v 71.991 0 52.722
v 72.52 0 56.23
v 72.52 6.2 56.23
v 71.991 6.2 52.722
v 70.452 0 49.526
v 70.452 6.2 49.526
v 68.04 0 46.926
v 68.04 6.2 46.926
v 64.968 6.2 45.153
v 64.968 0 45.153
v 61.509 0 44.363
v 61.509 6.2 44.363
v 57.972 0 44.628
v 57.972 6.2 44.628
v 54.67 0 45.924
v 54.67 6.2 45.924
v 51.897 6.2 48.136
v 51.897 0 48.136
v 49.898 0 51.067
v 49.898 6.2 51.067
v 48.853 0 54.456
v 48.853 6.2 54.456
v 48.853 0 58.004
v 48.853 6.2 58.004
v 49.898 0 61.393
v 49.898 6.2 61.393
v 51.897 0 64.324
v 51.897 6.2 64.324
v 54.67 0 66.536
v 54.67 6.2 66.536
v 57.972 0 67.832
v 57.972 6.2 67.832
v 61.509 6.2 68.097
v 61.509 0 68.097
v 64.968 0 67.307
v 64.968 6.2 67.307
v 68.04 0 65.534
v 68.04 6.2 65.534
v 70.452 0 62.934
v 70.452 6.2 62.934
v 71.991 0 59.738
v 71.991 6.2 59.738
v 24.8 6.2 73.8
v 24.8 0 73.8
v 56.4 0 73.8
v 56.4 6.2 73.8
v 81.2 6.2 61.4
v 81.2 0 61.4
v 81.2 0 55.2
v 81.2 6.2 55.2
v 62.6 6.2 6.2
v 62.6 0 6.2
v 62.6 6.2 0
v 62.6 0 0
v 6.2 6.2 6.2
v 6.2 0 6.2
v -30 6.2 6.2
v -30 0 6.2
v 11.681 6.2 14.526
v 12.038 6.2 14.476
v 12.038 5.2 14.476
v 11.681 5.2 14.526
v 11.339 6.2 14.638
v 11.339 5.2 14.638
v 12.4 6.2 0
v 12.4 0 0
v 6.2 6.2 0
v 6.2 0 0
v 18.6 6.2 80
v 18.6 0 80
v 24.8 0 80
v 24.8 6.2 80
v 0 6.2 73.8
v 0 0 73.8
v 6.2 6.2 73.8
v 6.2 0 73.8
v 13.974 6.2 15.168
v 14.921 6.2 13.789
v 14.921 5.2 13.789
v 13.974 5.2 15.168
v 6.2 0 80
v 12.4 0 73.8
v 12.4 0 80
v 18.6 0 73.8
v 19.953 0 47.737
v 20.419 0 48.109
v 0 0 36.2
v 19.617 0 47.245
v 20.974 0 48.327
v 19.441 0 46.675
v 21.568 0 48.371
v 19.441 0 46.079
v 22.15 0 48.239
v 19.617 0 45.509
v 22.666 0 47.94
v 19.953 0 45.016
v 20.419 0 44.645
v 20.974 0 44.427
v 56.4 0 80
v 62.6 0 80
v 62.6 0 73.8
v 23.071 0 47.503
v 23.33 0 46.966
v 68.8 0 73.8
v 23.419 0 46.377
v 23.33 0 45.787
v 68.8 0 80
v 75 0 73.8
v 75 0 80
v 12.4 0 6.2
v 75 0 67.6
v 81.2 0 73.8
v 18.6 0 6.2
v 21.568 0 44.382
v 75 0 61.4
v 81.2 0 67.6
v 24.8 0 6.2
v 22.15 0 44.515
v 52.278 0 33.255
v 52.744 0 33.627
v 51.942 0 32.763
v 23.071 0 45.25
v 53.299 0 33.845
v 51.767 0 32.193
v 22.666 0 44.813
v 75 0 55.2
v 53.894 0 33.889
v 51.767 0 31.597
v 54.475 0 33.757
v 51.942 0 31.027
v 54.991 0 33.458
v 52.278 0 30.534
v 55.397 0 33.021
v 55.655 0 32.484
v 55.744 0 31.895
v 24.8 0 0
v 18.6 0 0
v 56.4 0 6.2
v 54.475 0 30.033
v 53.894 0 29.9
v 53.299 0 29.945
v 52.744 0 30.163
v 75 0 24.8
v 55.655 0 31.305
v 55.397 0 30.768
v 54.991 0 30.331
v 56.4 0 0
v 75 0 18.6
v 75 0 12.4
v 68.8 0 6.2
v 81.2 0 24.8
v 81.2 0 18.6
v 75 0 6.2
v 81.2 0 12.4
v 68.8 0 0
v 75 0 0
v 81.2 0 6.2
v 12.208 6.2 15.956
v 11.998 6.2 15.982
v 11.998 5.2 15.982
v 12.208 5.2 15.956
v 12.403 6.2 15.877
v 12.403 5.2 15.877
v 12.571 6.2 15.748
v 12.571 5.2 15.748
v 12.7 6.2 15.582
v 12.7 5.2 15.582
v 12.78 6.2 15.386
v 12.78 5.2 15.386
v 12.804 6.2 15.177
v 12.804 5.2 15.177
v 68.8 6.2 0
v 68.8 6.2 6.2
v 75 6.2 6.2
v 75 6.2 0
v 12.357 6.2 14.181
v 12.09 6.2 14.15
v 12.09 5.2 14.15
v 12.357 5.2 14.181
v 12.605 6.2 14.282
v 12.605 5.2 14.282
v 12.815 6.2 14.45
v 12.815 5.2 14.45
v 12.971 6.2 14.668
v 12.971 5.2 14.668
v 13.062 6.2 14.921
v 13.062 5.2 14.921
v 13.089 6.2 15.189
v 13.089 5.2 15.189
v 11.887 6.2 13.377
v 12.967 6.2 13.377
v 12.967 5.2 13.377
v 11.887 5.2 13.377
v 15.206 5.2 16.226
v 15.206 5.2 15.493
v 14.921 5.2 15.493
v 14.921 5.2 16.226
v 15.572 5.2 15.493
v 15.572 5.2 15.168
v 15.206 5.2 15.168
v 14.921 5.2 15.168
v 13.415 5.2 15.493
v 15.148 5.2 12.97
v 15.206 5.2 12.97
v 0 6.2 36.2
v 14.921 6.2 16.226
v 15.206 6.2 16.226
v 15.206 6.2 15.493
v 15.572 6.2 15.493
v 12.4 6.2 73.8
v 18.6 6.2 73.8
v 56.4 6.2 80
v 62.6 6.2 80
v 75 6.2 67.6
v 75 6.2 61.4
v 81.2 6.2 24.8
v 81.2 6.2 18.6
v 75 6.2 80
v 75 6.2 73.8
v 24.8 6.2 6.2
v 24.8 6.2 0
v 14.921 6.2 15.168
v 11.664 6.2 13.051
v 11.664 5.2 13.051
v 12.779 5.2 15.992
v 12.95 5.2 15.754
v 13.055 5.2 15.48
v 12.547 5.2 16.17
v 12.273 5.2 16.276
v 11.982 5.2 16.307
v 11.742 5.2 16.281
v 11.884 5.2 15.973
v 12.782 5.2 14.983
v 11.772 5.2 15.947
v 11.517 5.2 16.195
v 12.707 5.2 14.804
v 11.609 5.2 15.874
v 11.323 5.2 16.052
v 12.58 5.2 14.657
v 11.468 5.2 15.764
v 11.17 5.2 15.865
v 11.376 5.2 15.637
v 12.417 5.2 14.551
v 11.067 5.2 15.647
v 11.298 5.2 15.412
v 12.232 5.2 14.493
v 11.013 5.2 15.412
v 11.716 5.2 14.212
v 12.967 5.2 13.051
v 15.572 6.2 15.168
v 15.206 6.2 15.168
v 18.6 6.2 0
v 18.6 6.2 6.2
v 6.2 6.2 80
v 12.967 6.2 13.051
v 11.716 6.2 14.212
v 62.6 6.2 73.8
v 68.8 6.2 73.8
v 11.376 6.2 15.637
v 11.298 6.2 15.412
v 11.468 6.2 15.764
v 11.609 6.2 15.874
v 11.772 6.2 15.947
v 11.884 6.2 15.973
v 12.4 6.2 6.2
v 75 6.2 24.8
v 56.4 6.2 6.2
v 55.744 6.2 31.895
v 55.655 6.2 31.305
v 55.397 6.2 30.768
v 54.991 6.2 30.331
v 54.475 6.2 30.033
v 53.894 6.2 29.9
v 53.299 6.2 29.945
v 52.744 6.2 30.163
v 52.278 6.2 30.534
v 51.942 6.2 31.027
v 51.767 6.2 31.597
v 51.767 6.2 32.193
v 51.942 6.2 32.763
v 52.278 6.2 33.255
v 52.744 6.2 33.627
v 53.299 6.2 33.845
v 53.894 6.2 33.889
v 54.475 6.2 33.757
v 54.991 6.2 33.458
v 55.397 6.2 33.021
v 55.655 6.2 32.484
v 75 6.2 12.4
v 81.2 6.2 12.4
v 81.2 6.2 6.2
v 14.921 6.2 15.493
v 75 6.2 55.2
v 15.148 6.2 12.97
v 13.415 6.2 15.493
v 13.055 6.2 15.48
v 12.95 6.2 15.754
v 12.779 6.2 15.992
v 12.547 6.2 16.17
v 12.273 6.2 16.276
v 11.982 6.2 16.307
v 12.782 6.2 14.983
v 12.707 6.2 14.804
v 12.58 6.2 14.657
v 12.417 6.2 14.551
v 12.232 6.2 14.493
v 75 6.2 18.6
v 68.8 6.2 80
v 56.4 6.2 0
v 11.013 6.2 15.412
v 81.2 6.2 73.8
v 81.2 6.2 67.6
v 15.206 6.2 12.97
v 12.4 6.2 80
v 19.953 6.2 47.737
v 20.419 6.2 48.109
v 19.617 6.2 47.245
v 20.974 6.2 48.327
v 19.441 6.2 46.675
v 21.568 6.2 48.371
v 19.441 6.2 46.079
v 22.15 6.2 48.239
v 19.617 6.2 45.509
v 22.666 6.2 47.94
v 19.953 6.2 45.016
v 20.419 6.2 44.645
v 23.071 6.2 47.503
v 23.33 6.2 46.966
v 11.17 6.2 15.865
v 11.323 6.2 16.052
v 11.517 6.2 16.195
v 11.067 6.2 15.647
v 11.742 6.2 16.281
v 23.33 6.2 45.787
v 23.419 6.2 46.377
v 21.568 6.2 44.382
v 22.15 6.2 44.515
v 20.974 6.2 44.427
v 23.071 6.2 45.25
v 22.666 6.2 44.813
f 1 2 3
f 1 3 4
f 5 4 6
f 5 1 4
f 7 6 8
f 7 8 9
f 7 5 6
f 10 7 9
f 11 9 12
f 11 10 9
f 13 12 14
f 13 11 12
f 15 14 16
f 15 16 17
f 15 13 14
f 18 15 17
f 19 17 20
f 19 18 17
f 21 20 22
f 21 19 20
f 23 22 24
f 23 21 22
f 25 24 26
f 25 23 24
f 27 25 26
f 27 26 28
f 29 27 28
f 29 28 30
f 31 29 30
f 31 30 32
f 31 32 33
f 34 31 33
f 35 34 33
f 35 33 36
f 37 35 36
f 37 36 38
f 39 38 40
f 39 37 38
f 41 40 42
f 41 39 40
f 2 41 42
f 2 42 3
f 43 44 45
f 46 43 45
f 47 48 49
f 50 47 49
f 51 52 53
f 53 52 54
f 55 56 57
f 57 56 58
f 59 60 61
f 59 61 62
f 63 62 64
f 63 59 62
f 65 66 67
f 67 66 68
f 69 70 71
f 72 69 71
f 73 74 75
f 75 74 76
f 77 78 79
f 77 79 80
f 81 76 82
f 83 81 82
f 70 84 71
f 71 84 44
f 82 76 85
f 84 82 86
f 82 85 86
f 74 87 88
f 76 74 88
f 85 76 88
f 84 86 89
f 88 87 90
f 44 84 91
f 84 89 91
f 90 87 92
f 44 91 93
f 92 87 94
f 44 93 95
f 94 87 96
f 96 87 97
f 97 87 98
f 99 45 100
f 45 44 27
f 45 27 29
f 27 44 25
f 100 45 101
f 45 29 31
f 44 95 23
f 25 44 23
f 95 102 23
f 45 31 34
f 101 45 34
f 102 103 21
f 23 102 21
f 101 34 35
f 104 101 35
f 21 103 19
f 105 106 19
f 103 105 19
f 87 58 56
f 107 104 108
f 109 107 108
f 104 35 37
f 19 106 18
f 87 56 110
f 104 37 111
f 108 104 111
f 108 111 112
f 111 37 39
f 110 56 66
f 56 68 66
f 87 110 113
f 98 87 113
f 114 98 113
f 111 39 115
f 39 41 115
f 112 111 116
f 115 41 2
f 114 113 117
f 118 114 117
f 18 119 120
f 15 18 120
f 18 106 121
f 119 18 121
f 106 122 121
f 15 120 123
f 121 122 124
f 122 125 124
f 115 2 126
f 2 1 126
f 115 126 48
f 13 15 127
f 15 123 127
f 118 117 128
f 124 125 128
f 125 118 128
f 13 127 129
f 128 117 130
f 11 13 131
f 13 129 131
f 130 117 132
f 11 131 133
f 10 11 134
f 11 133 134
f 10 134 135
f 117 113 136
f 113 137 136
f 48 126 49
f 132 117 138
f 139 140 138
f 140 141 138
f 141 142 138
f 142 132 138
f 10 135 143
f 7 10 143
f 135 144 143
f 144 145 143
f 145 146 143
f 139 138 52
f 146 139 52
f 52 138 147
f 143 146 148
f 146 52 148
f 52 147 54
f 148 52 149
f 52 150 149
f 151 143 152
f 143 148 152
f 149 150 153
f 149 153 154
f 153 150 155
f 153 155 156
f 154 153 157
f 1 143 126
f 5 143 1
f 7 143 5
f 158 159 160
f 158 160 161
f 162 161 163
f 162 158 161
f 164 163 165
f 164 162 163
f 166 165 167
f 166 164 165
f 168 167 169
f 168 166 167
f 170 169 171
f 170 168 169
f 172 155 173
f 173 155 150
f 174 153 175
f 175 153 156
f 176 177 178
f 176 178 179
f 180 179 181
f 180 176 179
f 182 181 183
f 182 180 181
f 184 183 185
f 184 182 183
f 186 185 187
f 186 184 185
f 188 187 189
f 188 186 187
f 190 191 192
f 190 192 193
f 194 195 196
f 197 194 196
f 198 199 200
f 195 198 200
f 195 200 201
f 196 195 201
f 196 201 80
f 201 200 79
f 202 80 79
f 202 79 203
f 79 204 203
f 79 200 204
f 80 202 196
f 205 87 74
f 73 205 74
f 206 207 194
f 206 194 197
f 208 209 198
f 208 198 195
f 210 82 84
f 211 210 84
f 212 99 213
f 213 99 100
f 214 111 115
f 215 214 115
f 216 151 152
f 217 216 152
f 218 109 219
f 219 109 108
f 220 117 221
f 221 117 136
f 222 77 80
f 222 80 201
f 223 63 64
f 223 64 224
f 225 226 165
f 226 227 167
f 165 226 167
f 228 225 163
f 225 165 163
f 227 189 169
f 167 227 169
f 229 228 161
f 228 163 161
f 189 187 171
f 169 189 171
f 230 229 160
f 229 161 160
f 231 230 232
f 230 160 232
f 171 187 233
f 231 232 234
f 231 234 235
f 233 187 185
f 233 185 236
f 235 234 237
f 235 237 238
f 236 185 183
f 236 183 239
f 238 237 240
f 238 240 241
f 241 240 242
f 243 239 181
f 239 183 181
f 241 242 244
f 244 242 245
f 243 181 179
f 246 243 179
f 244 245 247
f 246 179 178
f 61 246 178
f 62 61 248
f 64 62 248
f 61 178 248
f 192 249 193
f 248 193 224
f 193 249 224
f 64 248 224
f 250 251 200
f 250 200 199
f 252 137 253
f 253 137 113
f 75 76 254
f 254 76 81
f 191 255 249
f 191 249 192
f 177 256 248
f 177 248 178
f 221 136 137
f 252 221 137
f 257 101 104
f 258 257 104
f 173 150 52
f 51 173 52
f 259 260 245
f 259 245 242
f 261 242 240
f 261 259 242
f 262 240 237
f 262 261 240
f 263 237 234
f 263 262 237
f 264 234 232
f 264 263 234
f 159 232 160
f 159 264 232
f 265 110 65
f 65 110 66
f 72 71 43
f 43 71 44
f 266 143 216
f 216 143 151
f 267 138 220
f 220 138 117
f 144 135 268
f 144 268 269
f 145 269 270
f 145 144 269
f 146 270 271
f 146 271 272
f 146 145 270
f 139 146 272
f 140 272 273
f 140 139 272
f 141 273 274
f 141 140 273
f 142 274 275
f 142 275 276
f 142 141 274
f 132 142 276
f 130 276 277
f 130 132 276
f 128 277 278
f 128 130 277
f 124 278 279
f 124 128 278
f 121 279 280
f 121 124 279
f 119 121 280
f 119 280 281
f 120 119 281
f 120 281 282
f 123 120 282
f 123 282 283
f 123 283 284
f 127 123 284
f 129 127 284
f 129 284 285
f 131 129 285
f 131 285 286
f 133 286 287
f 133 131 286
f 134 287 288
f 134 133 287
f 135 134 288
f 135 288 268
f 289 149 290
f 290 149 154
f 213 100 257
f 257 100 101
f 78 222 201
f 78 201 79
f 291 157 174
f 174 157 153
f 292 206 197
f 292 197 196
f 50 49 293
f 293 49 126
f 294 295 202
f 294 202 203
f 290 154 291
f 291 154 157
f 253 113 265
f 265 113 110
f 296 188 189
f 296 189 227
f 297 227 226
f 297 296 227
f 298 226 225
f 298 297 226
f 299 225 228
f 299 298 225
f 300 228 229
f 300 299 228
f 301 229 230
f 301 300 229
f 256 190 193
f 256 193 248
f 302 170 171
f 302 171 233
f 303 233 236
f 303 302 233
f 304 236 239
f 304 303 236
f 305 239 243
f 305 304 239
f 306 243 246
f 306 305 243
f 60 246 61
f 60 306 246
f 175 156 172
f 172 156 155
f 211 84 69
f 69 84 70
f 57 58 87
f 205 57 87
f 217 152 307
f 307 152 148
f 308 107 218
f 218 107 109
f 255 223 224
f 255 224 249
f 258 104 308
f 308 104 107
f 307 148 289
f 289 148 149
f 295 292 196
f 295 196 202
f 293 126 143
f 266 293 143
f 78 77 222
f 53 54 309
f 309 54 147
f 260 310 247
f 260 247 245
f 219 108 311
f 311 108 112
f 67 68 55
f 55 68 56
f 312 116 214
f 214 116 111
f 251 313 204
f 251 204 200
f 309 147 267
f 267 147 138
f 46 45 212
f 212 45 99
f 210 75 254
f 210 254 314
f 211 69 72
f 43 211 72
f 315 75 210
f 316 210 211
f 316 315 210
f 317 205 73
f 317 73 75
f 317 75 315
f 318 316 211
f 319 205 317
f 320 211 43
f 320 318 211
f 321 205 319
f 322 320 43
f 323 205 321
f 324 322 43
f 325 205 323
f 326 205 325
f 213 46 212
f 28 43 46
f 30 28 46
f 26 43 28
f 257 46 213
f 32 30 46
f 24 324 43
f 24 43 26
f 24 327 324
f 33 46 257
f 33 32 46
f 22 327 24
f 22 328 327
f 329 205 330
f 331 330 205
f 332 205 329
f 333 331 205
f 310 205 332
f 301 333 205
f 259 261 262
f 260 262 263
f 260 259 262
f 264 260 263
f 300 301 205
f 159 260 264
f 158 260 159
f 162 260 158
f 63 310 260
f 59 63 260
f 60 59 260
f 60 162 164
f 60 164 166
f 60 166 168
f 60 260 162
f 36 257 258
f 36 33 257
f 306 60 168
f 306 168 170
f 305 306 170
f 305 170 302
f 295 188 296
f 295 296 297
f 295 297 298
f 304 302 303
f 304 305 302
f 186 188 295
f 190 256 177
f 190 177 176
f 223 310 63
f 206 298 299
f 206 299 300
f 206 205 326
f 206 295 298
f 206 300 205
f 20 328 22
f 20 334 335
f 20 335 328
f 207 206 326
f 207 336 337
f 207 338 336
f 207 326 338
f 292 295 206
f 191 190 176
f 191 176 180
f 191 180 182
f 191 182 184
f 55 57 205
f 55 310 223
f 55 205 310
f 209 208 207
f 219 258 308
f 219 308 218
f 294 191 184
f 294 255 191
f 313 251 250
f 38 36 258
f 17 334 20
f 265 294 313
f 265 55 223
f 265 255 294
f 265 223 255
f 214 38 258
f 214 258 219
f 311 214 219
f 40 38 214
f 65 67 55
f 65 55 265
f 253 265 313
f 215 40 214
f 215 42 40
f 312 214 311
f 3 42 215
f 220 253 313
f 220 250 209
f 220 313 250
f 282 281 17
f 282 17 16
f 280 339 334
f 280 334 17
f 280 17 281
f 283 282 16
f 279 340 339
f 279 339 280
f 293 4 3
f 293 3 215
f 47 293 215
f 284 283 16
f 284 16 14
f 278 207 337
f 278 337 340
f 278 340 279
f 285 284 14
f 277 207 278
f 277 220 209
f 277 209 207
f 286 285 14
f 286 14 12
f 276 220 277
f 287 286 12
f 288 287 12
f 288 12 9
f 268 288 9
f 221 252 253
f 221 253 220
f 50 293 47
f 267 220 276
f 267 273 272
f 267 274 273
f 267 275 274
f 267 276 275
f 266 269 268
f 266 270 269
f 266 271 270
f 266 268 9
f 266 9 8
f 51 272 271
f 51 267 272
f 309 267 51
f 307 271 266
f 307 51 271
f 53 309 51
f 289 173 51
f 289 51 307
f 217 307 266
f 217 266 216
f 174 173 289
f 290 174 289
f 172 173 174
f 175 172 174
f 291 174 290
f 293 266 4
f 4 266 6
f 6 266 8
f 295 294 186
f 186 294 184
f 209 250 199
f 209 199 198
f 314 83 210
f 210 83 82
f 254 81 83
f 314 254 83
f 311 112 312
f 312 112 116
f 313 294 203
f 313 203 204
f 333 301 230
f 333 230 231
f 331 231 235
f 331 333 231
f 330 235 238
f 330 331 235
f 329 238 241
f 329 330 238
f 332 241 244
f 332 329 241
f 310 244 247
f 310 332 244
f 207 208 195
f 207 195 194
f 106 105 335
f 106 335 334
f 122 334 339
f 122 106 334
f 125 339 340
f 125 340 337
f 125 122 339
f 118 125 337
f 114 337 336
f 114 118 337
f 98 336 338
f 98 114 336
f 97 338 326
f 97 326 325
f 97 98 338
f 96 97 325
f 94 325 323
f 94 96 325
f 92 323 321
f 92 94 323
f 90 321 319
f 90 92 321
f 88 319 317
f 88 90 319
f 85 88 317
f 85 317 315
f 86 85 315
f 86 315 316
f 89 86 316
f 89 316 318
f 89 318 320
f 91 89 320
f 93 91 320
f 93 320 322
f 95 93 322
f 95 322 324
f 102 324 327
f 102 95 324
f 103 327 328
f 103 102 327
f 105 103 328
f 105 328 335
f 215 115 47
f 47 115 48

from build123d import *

# Parameters (mm, degrees)
SKETCH1_R           = 2
SKETCH1_R_2         = 11.9
BOSS_EXTRUDE1_DEPTH = 6.2
CUT_EXTRUDE1_DEPTH  = 1


with BuildPart() as part:
    # Sketch1 → Boss-Extrude1 (new body)
    with BuildSketch(Plane(origin=(0, 0, 0), x_dir=(1, 0, 0), z_dir=(0, 1, 0))):
        Polygon((-30, -6.2), (0, -36.2), (0, -73.8), (6.2, -73.8), (6.2, -80), (12.4, -80), (12.4, -73.8), (18.6, -73.8), (18.6, -80), (24.8, -80), (24.8, -73.8), (56.4, -73.8), (56.4, -80), (62.6, -80), (62.6, -73.8), (68.8, -73.8), (68.8, -80), (75, -80), (75, -73.8), (81.2, -73.8), (81.2, -67.6), (75, -67.6), (75, -61.4), (81.2, -61.4), (81.2, -55.2), (75, -55.2), (75, -24.8), (81.2, -24.8), (81.2, -18.6), (75, -18.6), (75, -12.4), (81.2, -12.4), (81.2, -6.2), (75, -6.2), (75, 0), (68.8, 0), (68.8, -6.2), (62.6, -6.2), (62.6, 0), (56.4, 0), (56.4, -6.2), (24.8, -6.2), (24.8, 0), (18.6, 0), (18.6, -6.2), (12.4, -6.2), (12.4, 0), (6.2, 0), (6.2, -6.2), align=None)
        with Locations((53.744267305, -31.89475279)):
            Circle(SKETCH1_R, mode=Mode.SUBTRACT)
        with Locations((21.41882184, -46.37677641)):
            Circle(SKETCH1_R, mode=Mode.SUBTRACT)
        with Locations((60.62, -56.23)):
            Circle(SKETCH1_R_2, mode=Mode.SUBTRACT)
    extrude(amount=BOSS_EXTRUDE1_DEPTH)

    # Sketch2 → Cut-Extrude1 (cut)
    with BuildSketch(Plane(origin=(0, 6.2, 0), x_dir=(1, 0, 0), z_dir=(0, 1, 0))):
        with BuildLine():
            Line((12.966892289, -13.0509751), (12.966892289, -13.376616125))
            Line((12.966892289, -13.376616125), (11.886934356, -13.376616125))
            Line((11.886934356, -13.376616125), (11.715845614, -14.211707271))
            add(Edge.make_bspline(
                [(11.715845614, -14.211707271), (11.749460586, -14.202426953), (11.814584277, -14.184447805), (11.910705008, -14.164485427), (12.001956507, -14.152451775), (12.061170593, -14.150808657), (12.08982398, -14.150013561)],
                knots=[0, 0, 0, 0, 0.000104595, 0.000202637, 0.000294305, 0.000380252, 0.000380252, 0.000380252, 0.000380252], degree=3))
            add(Edge.make_bspline(
                [(12.08982398, -14.150013561), (12.125278515, -14.150780946), (12.19499099, -14.152289816), (12.296989177, -14.166778565), (12.394355445, -14.189584059), (12.486886166, -14.221443389), (12.574752523, -14.262182933), (12.657146096, -14.313073593), (12.735303632, -14.372521686), (12.807822985, -14.440870376), (12.873612893, -14.516092128), (12.931457755, -14.596971054), (12.980590962, -14.682721147), (13.02010679, -14.7741617), (13.05166115, -14.870281789), (13.072663317, -14.972092774), (13.086648474, -15.078634998), (13.088210925, -15.151482715), (13.089007673, -15.188630348)],
                knots=[0, 0, 0, 0, 0.000106308, 0.000209029, 0.000308378, 0.000405929, 0.000502102, 0.000598312, 0.00069588, 0.000796219, 0.000896736, 0.000995218, 0.001094066, 0.001192613, 0.001293582, 0.001396995, 0.001504047, 0.001615439, 0.001615439, 0.001615439, 0.001615439], degree=3))
            add(Edge.make_bspline(
                [(13.089007673, -15.188630348), (13.088404355, -15.214504077), (13.087205872, -15.265901873), (13.081111153, -15.342232683), (13.069376611, -15.416947539), (13.053621604, -15.490056352), (13.03317241, -15.561420711), (13.00841734, -15.631244882), (12.978122372, -15.699094276), (12.944892482, -15.765610884), (12.907476034, -15.829290958), (12.865948388, -15.888843968), (12.822073978, -15.94516328), (12.774865007, -15.997644881), (12.723882676, -16.045943904), (12.66974442, -16.090346988), (12.612882239, -16.131605052), (12.552416412, -16.168043343), (12.489694303, -16.201574025), (12.423810134, -16.229081805), (12.356263642, -16.253674927), (12.286082647, -16.273277856), (12.213426117, -16.288638102), (12.138174285, -16.299070789), (12.06072182, -16.306669415), (12.008220916, -16.307145081), (11.981700983, -16.307385356)],
                knots=[0, 0, 0, 0, 7.7636e-05, 0.000154223, 0.000229512, 0.000304362, 0.000378447, 0.000452077, 0.000526407, 0.000601214, 0.00067506, 0.000747747, 0.00081887, 0.000889121, 0.000959302, 0.001029336, 0.001099058, 0.00116985, 0.001240974, 0.00131221, 0.00138383, 0.001456517, 0.001530612, 0.001606437, 0.001684346, 0.001763871, 0.001763871, 0.001763871, 0.001763871], degree=3))
            add(Edge.make_bspline(
                [(11.981700983, -16.307385356), (11.950065119, -16.306758667), (11.887825294, -16.305525731), (11.796638779, -16.292627534), (11.708904816, -16.274154553), (11.625329653, -16.246363079), (11.545164292, -16.211540319), (11.469487969, -16.167529221), (11.396367015, -16.11765532), (11.328773953, -16.058799571), (11.266039479, -15.994468916), (11.209881432, -15.924657342), (11.159867401, -15.850517062), (11.116798302, -15.771688023), (11.080060812, -15.688377355), (11.051200072, -15.600272919), (11.027906136, -15.507835058), (11.018051462, -15.444195802), (11.013046135, -15.411872536)],
                knots=[0, 0, 0, 0, 9.4843e-05, 0.000186593, 0.000275792, 0.000363484, 0.000450342, 0.000537514, 0.000625728, 0.000715478, 0.000805885, 0.000894984, 0.00098389, 0.001073836, 0.001164117, 0.001256635, 0.001351658, 0.001449737, 0.001449737, 0.001449737, 0.001449737], degree=3))
            Line((11.013046135, -15.411872536), (11.297982032, -15.411872536))
            add(Edge.make_bspline(
                [(11.297982032, -15.411872536), (11.304992938, -15.442149746), (11.318468288, -15.500344226), (11.34804636, -15.582106228), (11.384210404, -15.654967238), (11.42721292, -15.719891075), (11.478511877, -15.776504951), (11.537049287, -15.826957571), (11.602679007, -15.872473581), (11.675607151, -15.910412806), (11.75254473, -15.942769461), (11.833069271, -15.964315641), (11.914988214, -15.979465737), (11.970395021, -15.980982263), (11.998237441, -15.981744331)],
                knots=[0, 0, 0, 0, 9.3172e-05, 0.000179081, 0.000260145, 0.000336703, 0.000411917, 0.000488562, 0.000568128, 0.000650923, 0.00073478, 0.000817953, 0.000900557, 0.000983994, 0.000983994, 0.000983994, 0.000983994], degree=3))
            add(Edge.make_bspline(
                [(11.998237441, -15.981744331), (12.02541403, -15.980999768), (12.078924956, -15.979533718), (12.157675285, -15.968249757), (12.233705535, -15.950871103), (12.306265495, -15.924863448), (12.376624891, -15.893254311), (12.443003954, -15.852691349), (12.507322993, -15.806009761), (12.5675828, -15.752527675), (12.622772872, -15.693590881), (12.671537353, -15.63056496), (12.71215641, -15.563330392), (12.746386638, -15.493051175), (12.772379273, -15.418957055), (12.790922163, -15.341395275), (12.801810652, -15.260174257), (12.803308508, -15.204775669), (12.804071776, -15.176546013)],
                knots=[0, 0, 0, 0, 8.15e-05, 0.000160473, 0.000238226, 0.000315066, 0.000391338, 0.000469218, 0.000547964, 0.000629516, 0.000710512, 0.000789892, 0.000868102, 0.000945761, 0.001024012, 0.00110315, 0.001184644, 0.001269321, 0.001269321, 0.001269321, 0.001269321], degree=3))
            add(Edge.make_bspline(
                [(12.804071776, -15.176546013), (12.803474441, -15.151077296), (12.802305243, -15.101225905), (12.792752511, -15.028292339), (12.776136401, -14.959283222), (12.75307331, -14.89386531), (12.723791185, -14.831976902), (12.688007744, -14.773554125), (12.645051448, -14.719367005), (12.595982377, -14.669390189), (12.542226869, -14.623266624), (12.482860045, -14.583947345), (12.419124254, -14.550869363), (12.351787403, -14.522323393), (12.279247817, -14.501821288), (12.202942015, -14.486428992), (12.122046001, -14.477525056), (12.066736877, -14.476289629), (12.038306552, -14.475654587)],
                knots=[0, 0, 0, 0, 7.6388e-05, 0.000149519, 0.000220172, 0.000288967, 0.000357247, 0.000425206, 0.000494043, 0.000564207, 0.000635056, 0.000706145, 0.000777268, 0.000850264, 0.000925136, 0.001002969, 0.001083601, 0.001168886, 0.001168886, 0.001168886, 0.001168886], degree=3))
            add(Edge.make_bspline(
                [(12.038306552, -14.475654587), (12.013696738, -14.476181266), (11.962883715, -14.477268725), (11.884939437, -14.485275618), (11.803031945, -14.498192693), (11.717475224, -14.515960217), (11.628012335, -14.539211265), (11.534832071, -14.567073705), (11.437738515, -14.600385804), (11.372317437, -14.625542884), (11.338687161, -14.6384751)],
                knots=[0, 0, 0, 0, 7.3822e-05, 0.000152423, 0.000234822, 0.000322511, 0.00041445, 0.000512043, 0.000614219, 0.000722306, 0.000722306, 0.000722306, 0.000722306], degree=3))
            Line((11.338687161, -14.6384751), (11.664328186, -13.0509751))
            Line((11.664328186, -13.0509751), (12.966892289, -13.0509751))
        make_face()
        Polygon((15.147796736, -12.969564843), (15.20567434, -12.969564843), (15.20567434, -15.167641766), (15.572020494, -15.167641766), (15.572020494, -15.493282792), (15.20567434, -15.493282792), (15.20567434, -16.2259751), (14.920738443, -16.2259751), (14.920738443, -15.493282792), (13.414648699, -15.493282792), align=None)
        Polygon((14.920738443, -15.167641766), (14.920738443, -13.788755549), (13.974344212, -15.167641766), align=None, mode=Mode.SUBTRACT)
    extrude(amount=-CUT_EXTRUDE1_DEPTH, mode=Mode.SUBTRACT)


solid = part.part
